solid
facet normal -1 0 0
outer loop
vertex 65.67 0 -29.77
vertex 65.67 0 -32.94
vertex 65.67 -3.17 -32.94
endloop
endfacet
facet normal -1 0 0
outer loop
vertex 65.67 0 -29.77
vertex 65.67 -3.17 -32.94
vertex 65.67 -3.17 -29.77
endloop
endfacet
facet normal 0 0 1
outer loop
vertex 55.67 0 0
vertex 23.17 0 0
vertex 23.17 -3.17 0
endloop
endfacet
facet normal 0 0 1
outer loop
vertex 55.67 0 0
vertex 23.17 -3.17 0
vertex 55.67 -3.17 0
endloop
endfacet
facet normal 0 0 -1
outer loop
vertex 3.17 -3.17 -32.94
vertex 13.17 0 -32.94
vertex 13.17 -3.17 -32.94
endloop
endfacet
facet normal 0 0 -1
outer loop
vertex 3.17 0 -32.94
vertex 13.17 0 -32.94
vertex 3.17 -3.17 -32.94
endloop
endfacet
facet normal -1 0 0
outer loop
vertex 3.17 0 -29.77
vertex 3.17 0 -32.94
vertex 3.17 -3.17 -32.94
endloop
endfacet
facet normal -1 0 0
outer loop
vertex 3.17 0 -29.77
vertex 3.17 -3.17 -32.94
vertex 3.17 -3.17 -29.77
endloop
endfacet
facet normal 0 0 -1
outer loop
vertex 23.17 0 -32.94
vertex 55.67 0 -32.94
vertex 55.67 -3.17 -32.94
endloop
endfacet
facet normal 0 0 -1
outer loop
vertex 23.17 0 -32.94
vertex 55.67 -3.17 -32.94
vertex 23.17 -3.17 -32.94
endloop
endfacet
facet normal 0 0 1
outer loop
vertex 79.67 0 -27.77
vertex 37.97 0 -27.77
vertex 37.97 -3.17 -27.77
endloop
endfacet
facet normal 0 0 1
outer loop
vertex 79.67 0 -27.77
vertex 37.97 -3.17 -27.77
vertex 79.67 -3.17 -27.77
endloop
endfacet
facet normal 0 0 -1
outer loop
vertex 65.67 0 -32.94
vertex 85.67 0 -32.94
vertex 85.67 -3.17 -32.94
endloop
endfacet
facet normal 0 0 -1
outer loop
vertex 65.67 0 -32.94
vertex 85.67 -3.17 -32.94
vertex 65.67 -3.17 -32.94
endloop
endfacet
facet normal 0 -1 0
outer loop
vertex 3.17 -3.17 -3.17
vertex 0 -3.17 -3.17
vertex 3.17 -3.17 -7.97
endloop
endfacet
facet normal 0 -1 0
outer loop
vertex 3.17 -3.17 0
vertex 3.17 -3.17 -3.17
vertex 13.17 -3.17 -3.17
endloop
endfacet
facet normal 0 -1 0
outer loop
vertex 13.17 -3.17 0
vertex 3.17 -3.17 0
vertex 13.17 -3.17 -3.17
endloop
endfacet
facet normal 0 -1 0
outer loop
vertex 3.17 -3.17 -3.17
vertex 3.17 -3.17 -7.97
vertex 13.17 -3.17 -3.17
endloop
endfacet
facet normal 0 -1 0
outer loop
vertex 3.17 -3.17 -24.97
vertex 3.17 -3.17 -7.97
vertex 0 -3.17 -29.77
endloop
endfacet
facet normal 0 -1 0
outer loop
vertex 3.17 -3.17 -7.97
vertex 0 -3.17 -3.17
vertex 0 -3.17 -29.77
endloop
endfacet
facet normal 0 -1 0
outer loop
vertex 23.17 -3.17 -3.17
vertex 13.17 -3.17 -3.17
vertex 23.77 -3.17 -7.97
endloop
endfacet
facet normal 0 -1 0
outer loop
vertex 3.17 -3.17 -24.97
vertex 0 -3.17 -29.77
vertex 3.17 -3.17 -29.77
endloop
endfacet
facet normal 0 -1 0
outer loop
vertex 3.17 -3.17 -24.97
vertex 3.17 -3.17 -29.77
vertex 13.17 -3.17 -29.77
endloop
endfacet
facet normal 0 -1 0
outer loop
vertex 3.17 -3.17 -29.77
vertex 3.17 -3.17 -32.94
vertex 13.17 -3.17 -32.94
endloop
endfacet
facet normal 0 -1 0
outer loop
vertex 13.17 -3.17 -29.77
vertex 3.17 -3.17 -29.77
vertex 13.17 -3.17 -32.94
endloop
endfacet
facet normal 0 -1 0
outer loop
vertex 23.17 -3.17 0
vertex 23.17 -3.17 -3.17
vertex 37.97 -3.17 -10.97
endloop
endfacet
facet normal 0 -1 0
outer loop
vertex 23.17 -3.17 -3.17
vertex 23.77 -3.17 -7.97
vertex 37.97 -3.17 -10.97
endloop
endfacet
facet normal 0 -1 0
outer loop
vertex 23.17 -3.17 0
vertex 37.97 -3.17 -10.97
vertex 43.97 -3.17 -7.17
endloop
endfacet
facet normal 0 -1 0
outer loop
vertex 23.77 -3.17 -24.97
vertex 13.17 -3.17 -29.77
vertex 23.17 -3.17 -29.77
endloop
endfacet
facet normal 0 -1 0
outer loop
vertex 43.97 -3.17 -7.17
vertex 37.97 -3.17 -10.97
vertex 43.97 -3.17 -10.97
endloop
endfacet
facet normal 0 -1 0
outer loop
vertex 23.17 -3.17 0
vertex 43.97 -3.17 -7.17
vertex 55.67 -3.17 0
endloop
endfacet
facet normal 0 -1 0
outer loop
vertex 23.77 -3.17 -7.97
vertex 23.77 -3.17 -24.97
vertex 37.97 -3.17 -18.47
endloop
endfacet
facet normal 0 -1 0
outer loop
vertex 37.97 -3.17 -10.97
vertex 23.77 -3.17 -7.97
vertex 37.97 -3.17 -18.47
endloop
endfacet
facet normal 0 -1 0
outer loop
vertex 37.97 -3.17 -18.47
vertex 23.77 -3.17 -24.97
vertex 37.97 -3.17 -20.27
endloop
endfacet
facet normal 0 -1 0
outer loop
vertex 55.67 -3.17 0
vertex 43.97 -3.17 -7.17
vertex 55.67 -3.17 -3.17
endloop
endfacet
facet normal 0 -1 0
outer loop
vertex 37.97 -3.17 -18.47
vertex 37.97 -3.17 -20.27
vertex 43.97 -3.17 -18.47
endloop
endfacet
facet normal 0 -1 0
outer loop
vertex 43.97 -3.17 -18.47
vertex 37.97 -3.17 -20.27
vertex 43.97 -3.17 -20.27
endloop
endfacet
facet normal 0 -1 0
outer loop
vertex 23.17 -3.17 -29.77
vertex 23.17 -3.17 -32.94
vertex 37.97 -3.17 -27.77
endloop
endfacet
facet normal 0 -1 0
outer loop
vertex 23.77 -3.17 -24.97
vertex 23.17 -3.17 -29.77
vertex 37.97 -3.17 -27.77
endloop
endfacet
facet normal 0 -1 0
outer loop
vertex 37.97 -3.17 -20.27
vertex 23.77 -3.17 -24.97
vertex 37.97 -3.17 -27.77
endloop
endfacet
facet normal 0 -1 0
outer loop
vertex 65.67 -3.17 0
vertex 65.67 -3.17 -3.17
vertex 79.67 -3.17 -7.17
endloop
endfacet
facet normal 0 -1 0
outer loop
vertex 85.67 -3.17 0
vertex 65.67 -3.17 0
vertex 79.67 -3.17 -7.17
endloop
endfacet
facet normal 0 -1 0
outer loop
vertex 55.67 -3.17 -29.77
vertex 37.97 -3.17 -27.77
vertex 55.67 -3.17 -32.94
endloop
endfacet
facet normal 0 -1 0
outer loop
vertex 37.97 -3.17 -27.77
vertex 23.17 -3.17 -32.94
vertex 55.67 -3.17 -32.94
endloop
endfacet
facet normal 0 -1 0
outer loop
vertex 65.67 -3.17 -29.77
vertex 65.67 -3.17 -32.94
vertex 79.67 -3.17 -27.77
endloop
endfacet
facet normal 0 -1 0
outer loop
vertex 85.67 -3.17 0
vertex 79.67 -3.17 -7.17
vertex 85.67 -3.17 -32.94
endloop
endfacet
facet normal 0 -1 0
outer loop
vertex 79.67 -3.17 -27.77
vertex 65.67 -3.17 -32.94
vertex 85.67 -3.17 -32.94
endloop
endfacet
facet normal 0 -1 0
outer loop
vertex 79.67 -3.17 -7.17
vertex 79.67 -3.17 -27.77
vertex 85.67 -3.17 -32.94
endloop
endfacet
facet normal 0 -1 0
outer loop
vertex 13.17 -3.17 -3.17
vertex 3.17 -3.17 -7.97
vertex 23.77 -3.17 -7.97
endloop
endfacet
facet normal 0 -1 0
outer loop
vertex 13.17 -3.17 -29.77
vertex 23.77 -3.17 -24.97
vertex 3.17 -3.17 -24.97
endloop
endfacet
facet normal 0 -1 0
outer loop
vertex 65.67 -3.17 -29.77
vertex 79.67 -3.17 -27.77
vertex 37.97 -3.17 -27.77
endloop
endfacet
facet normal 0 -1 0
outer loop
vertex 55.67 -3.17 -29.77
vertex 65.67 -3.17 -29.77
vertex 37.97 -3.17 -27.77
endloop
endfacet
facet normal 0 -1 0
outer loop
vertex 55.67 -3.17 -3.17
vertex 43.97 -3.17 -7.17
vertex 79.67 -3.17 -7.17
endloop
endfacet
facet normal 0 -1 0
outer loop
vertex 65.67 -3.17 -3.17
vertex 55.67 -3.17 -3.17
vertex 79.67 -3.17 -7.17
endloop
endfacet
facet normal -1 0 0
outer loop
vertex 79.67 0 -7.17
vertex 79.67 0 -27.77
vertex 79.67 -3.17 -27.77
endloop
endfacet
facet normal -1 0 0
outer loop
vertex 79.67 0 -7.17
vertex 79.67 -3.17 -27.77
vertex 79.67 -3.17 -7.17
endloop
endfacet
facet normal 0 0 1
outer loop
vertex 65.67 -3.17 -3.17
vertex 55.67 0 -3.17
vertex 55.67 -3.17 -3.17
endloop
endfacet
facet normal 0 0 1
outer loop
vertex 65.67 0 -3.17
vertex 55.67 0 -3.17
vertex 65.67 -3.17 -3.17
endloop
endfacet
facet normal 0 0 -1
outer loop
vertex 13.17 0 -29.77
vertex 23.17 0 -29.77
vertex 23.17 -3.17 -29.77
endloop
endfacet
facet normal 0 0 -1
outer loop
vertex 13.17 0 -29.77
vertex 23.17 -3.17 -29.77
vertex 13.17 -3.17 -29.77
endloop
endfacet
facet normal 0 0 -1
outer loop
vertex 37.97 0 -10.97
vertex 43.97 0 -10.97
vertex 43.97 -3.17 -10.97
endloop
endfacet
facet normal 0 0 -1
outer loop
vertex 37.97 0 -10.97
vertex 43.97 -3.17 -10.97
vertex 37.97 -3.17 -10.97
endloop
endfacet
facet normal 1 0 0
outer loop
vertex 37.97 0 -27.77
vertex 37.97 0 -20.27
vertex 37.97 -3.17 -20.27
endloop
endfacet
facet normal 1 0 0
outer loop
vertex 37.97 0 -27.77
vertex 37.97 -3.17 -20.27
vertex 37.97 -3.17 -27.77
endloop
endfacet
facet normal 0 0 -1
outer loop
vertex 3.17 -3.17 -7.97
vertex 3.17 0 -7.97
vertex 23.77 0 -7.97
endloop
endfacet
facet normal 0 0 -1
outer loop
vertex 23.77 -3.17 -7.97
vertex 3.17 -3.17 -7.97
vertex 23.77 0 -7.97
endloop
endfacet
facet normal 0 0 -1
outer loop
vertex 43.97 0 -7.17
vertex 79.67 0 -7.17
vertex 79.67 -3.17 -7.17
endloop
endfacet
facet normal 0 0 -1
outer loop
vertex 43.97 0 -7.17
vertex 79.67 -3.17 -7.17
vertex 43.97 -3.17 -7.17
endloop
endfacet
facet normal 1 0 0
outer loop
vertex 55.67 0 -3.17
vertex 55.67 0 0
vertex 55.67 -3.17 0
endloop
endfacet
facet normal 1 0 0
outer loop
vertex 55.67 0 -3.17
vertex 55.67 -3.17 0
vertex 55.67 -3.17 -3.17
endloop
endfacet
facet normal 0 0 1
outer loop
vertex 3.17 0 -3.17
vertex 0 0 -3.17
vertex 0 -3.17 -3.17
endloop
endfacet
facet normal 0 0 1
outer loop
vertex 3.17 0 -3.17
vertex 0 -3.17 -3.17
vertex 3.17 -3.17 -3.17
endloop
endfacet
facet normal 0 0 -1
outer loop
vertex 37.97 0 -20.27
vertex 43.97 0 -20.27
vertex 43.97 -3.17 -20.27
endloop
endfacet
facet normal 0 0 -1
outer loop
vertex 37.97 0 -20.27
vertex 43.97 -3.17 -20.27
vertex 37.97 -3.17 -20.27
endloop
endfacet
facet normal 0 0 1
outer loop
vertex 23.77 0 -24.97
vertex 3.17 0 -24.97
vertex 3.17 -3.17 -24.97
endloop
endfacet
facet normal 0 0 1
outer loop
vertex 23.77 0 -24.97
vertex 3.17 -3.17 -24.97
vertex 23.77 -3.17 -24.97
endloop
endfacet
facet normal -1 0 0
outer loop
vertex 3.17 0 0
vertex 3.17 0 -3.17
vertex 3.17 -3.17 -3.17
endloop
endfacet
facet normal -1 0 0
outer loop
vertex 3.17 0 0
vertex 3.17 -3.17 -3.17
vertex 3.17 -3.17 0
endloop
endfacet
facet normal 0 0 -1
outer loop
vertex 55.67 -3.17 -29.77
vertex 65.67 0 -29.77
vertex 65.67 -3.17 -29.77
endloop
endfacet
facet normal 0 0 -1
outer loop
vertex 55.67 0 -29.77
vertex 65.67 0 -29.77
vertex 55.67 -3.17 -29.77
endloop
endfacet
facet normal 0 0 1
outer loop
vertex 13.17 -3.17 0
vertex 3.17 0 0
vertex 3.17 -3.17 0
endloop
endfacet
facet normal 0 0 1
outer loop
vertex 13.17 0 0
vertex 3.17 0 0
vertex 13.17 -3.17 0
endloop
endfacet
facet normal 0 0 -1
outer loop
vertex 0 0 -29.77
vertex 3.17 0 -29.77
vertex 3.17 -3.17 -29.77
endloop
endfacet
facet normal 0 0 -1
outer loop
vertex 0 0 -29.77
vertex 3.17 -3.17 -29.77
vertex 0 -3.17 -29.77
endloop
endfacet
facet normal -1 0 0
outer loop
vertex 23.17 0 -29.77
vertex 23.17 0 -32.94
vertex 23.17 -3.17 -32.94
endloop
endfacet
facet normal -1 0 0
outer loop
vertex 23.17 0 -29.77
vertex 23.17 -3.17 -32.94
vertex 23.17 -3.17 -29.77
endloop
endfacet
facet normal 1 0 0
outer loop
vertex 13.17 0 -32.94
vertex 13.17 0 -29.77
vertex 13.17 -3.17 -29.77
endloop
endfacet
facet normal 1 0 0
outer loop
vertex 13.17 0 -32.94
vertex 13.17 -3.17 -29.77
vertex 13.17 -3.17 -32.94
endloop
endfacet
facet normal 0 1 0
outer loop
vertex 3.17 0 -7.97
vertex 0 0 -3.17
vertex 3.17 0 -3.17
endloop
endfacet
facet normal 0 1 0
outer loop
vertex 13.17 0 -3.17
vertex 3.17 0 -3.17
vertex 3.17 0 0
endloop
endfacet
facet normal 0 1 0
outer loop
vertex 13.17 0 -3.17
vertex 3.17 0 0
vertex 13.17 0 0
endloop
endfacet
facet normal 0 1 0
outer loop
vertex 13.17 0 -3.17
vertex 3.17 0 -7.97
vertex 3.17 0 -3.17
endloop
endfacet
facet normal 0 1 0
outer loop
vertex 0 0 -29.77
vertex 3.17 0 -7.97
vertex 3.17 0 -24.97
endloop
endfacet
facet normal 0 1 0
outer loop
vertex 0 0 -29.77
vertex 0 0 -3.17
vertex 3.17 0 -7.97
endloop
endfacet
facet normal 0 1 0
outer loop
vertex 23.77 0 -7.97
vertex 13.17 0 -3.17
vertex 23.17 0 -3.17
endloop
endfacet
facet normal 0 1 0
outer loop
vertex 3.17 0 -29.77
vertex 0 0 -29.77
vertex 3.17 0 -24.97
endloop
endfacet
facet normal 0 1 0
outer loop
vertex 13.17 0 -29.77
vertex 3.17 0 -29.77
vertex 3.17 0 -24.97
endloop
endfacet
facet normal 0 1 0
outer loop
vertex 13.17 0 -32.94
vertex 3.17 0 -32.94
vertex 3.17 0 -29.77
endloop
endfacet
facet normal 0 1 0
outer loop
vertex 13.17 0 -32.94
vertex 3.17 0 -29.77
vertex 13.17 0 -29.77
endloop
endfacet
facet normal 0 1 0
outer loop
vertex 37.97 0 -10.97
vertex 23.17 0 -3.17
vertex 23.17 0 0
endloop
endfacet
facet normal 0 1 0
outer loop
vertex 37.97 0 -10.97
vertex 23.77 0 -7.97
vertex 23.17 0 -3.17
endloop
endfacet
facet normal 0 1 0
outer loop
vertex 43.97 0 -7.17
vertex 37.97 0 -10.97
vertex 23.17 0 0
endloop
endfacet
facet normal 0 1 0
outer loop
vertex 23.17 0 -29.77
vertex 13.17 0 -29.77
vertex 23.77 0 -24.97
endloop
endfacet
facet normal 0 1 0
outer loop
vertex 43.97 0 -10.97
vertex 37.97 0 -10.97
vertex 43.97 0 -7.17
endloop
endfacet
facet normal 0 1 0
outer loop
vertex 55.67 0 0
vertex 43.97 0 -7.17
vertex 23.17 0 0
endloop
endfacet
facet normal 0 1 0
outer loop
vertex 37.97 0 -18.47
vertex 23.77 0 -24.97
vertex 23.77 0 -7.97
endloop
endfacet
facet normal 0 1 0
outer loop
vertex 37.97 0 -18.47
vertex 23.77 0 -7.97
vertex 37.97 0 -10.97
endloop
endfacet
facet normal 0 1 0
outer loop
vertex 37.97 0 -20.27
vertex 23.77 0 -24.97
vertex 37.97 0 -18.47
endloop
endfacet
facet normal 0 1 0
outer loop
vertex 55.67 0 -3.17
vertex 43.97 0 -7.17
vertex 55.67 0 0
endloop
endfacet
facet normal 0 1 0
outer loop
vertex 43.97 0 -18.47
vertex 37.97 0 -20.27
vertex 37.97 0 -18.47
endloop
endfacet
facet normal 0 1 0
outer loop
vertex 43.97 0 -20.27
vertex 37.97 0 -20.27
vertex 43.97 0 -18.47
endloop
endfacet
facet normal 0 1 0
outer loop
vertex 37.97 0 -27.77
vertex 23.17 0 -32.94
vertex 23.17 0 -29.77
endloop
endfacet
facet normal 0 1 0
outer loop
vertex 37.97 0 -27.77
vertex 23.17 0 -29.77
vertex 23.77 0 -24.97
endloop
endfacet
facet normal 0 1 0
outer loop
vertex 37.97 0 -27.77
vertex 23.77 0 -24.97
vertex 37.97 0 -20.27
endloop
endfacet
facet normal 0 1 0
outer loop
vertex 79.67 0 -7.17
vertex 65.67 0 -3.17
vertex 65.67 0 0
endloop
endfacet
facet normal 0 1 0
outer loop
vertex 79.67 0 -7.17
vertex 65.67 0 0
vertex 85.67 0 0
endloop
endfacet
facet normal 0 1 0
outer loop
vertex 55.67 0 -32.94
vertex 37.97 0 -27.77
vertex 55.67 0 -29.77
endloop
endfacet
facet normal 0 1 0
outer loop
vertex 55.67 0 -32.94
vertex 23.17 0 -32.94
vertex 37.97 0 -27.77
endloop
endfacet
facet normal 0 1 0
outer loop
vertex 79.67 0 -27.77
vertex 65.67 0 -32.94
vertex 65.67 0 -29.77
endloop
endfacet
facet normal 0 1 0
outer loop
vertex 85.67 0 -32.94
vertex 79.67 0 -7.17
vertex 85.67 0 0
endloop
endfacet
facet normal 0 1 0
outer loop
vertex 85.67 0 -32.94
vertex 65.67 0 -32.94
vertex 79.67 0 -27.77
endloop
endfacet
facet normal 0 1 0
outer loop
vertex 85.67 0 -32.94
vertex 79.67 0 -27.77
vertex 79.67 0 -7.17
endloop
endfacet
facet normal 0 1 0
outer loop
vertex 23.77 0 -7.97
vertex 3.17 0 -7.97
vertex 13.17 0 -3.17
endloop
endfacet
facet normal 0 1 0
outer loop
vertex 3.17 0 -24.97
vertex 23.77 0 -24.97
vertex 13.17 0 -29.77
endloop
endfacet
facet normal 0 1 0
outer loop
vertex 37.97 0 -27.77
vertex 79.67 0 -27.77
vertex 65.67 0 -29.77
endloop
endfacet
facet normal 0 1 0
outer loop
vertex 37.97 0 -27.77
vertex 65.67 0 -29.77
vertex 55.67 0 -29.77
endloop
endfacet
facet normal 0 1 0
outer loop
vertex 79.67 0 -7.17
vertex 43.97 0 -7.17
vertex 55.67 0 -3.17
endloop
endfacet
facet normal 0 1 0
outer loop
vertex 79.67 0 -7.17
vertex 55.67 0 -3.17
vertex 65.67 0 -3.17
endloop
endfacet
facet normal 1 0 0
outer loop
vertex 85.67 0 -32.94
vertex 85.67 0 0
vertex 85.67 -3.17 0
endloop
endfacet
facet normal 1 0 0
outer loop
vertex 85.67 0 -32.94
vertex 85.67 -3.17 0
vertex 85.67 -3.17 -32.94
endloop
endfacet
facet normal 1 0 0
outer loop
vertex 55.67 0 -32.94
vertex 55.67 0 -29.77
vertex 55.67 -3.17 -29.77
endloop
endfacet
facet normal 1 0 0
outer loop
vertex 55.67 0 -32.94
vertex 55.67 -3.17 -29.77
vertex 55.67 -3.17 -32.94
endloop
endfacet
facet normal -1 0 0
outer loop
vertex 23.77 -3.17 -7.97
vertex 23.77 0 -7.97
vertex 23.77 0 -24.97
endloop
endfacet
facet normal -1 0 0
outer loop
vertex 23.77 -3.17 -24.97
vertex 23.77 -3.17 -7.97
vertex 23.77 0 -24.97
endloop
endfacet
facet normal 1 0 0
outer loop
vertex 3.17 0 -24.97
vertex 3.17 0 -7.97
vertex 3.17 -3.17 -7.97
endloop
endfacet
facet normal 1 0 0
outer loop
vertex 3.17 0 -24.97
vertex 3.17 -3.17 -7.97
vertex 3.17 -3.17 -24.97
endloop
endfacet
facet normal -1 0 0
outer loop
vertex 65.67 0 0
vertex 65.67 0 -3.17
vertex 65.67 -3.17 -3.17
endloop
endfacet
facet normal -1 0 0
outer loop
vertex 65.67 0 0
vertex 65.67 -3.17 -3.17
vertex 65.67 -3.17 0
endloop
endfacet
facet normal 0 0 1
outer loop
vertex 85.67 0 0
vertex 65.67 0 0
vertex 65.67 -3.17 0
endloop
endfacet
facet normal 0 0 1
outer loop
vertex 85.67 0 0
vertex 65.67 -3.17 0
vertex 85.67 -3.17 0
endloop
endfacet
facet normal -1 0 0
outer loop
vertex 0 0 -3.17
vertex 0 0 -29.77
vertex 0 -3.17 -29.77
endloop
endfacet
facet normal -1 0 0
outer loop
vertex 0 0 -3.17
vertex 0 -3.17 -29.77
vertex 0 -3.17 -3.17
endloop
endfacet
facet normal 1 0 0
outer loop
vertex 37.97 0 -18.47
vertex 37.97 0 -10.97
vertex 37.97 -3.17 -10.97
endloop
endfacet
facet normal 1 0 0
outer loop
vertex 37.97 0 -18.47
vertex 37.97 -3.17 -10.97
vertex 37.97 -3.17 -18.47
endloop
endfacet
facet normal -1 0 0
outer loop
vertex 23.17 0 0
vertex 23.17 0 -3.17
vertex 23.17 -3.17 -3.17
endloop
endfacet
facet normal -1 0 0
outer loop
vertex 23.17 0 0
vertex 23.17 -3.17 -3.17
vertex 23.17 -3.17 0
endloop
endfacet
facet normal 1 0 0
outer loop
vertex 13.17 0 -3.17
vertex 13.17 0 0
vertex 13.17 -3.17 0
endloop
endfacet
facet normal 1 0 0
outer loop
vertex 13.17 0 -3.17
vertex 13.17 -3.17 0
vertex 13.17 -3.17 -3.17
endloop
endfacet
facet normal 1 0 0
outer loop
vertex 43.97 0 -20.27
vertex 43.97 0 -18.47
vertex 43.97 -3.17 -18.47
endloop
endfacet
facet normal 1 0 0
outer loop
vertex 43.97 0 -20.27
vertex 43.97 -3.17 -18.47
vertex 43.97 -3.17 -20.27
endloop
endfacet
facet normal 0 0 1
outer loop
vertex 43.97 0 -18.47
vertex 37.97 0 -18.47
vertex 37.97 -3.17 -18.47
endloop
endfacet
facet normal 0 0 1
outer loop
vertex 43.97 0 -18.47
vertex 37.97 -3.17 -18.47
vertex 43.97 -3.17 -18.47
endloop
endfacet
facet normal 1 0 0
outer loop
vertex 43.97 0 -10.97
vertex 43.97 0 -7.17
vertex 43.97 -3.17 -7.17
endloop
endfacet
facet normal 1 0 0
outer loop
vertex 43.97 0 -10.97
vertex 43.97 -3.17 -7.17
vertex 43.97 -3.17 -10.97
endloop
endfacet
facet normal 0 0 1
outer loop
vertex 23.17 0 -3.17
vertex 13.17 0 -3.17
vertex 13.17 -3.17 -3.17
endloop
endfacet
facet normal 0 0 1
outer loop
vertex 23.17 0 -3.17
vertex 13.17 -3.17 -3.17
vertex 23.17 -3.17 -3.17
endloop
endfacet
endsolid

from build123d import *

# Parameters (mm, degrees)
SKETCH1_W           = 20.6
SKETCH1_H           = 17
BOSS_EXTRUDE1_DEPTH = 3.17


with BuildPart() as part:
    # Sketch1 → Boss-Extrude1 (new body)
    with BuildSketch(Plane(origin=(0, 0, 0), x_dir=(1, 0, 0), z_dir=(0, 1, 0))):
        Polygon((55.67, 29.77), (55.67, 32.94), (23.17, 32.94), (23.17, 29.77), (13.17, 29.77), (13.17, 32.94), (3.17, 32.94), (3.17, 29.77), (0, 29.77), (0, 3.17), (3.17, 3.17), (3.17, 0), (13.17, 0), (13.17, 3.17), (23.17, 3.17), (23.17, 0), (55.67, 0), (55.67, 3.17), (65.67, 3.17), (65.67, 0), (85.67, 0), (85.67, 32.94), (65.67, 32.94), (65.67, 29.77), align=None)
        with Locations((13.47, 16.47)):
            Rectangle(SKETCH1_W, SKETCH1_H, mode=Mode.SUBTRACT)
        Polygon((37.97, 27.77), (43.97, 27.77), (79.67, 27.77), (79.67, 7.17), (43.97, 7.17), (43.97, 10.97), (37.97, 10.97), (37.97, 18.47), (43.97, 18.47), (43.97, 20.27), (37.97, 20.27), align=None, mode=Mode.SUBTRACT)
    extrude(amount=-BOSS_EXTRUDE1_DEPTH)


solid = part.part
